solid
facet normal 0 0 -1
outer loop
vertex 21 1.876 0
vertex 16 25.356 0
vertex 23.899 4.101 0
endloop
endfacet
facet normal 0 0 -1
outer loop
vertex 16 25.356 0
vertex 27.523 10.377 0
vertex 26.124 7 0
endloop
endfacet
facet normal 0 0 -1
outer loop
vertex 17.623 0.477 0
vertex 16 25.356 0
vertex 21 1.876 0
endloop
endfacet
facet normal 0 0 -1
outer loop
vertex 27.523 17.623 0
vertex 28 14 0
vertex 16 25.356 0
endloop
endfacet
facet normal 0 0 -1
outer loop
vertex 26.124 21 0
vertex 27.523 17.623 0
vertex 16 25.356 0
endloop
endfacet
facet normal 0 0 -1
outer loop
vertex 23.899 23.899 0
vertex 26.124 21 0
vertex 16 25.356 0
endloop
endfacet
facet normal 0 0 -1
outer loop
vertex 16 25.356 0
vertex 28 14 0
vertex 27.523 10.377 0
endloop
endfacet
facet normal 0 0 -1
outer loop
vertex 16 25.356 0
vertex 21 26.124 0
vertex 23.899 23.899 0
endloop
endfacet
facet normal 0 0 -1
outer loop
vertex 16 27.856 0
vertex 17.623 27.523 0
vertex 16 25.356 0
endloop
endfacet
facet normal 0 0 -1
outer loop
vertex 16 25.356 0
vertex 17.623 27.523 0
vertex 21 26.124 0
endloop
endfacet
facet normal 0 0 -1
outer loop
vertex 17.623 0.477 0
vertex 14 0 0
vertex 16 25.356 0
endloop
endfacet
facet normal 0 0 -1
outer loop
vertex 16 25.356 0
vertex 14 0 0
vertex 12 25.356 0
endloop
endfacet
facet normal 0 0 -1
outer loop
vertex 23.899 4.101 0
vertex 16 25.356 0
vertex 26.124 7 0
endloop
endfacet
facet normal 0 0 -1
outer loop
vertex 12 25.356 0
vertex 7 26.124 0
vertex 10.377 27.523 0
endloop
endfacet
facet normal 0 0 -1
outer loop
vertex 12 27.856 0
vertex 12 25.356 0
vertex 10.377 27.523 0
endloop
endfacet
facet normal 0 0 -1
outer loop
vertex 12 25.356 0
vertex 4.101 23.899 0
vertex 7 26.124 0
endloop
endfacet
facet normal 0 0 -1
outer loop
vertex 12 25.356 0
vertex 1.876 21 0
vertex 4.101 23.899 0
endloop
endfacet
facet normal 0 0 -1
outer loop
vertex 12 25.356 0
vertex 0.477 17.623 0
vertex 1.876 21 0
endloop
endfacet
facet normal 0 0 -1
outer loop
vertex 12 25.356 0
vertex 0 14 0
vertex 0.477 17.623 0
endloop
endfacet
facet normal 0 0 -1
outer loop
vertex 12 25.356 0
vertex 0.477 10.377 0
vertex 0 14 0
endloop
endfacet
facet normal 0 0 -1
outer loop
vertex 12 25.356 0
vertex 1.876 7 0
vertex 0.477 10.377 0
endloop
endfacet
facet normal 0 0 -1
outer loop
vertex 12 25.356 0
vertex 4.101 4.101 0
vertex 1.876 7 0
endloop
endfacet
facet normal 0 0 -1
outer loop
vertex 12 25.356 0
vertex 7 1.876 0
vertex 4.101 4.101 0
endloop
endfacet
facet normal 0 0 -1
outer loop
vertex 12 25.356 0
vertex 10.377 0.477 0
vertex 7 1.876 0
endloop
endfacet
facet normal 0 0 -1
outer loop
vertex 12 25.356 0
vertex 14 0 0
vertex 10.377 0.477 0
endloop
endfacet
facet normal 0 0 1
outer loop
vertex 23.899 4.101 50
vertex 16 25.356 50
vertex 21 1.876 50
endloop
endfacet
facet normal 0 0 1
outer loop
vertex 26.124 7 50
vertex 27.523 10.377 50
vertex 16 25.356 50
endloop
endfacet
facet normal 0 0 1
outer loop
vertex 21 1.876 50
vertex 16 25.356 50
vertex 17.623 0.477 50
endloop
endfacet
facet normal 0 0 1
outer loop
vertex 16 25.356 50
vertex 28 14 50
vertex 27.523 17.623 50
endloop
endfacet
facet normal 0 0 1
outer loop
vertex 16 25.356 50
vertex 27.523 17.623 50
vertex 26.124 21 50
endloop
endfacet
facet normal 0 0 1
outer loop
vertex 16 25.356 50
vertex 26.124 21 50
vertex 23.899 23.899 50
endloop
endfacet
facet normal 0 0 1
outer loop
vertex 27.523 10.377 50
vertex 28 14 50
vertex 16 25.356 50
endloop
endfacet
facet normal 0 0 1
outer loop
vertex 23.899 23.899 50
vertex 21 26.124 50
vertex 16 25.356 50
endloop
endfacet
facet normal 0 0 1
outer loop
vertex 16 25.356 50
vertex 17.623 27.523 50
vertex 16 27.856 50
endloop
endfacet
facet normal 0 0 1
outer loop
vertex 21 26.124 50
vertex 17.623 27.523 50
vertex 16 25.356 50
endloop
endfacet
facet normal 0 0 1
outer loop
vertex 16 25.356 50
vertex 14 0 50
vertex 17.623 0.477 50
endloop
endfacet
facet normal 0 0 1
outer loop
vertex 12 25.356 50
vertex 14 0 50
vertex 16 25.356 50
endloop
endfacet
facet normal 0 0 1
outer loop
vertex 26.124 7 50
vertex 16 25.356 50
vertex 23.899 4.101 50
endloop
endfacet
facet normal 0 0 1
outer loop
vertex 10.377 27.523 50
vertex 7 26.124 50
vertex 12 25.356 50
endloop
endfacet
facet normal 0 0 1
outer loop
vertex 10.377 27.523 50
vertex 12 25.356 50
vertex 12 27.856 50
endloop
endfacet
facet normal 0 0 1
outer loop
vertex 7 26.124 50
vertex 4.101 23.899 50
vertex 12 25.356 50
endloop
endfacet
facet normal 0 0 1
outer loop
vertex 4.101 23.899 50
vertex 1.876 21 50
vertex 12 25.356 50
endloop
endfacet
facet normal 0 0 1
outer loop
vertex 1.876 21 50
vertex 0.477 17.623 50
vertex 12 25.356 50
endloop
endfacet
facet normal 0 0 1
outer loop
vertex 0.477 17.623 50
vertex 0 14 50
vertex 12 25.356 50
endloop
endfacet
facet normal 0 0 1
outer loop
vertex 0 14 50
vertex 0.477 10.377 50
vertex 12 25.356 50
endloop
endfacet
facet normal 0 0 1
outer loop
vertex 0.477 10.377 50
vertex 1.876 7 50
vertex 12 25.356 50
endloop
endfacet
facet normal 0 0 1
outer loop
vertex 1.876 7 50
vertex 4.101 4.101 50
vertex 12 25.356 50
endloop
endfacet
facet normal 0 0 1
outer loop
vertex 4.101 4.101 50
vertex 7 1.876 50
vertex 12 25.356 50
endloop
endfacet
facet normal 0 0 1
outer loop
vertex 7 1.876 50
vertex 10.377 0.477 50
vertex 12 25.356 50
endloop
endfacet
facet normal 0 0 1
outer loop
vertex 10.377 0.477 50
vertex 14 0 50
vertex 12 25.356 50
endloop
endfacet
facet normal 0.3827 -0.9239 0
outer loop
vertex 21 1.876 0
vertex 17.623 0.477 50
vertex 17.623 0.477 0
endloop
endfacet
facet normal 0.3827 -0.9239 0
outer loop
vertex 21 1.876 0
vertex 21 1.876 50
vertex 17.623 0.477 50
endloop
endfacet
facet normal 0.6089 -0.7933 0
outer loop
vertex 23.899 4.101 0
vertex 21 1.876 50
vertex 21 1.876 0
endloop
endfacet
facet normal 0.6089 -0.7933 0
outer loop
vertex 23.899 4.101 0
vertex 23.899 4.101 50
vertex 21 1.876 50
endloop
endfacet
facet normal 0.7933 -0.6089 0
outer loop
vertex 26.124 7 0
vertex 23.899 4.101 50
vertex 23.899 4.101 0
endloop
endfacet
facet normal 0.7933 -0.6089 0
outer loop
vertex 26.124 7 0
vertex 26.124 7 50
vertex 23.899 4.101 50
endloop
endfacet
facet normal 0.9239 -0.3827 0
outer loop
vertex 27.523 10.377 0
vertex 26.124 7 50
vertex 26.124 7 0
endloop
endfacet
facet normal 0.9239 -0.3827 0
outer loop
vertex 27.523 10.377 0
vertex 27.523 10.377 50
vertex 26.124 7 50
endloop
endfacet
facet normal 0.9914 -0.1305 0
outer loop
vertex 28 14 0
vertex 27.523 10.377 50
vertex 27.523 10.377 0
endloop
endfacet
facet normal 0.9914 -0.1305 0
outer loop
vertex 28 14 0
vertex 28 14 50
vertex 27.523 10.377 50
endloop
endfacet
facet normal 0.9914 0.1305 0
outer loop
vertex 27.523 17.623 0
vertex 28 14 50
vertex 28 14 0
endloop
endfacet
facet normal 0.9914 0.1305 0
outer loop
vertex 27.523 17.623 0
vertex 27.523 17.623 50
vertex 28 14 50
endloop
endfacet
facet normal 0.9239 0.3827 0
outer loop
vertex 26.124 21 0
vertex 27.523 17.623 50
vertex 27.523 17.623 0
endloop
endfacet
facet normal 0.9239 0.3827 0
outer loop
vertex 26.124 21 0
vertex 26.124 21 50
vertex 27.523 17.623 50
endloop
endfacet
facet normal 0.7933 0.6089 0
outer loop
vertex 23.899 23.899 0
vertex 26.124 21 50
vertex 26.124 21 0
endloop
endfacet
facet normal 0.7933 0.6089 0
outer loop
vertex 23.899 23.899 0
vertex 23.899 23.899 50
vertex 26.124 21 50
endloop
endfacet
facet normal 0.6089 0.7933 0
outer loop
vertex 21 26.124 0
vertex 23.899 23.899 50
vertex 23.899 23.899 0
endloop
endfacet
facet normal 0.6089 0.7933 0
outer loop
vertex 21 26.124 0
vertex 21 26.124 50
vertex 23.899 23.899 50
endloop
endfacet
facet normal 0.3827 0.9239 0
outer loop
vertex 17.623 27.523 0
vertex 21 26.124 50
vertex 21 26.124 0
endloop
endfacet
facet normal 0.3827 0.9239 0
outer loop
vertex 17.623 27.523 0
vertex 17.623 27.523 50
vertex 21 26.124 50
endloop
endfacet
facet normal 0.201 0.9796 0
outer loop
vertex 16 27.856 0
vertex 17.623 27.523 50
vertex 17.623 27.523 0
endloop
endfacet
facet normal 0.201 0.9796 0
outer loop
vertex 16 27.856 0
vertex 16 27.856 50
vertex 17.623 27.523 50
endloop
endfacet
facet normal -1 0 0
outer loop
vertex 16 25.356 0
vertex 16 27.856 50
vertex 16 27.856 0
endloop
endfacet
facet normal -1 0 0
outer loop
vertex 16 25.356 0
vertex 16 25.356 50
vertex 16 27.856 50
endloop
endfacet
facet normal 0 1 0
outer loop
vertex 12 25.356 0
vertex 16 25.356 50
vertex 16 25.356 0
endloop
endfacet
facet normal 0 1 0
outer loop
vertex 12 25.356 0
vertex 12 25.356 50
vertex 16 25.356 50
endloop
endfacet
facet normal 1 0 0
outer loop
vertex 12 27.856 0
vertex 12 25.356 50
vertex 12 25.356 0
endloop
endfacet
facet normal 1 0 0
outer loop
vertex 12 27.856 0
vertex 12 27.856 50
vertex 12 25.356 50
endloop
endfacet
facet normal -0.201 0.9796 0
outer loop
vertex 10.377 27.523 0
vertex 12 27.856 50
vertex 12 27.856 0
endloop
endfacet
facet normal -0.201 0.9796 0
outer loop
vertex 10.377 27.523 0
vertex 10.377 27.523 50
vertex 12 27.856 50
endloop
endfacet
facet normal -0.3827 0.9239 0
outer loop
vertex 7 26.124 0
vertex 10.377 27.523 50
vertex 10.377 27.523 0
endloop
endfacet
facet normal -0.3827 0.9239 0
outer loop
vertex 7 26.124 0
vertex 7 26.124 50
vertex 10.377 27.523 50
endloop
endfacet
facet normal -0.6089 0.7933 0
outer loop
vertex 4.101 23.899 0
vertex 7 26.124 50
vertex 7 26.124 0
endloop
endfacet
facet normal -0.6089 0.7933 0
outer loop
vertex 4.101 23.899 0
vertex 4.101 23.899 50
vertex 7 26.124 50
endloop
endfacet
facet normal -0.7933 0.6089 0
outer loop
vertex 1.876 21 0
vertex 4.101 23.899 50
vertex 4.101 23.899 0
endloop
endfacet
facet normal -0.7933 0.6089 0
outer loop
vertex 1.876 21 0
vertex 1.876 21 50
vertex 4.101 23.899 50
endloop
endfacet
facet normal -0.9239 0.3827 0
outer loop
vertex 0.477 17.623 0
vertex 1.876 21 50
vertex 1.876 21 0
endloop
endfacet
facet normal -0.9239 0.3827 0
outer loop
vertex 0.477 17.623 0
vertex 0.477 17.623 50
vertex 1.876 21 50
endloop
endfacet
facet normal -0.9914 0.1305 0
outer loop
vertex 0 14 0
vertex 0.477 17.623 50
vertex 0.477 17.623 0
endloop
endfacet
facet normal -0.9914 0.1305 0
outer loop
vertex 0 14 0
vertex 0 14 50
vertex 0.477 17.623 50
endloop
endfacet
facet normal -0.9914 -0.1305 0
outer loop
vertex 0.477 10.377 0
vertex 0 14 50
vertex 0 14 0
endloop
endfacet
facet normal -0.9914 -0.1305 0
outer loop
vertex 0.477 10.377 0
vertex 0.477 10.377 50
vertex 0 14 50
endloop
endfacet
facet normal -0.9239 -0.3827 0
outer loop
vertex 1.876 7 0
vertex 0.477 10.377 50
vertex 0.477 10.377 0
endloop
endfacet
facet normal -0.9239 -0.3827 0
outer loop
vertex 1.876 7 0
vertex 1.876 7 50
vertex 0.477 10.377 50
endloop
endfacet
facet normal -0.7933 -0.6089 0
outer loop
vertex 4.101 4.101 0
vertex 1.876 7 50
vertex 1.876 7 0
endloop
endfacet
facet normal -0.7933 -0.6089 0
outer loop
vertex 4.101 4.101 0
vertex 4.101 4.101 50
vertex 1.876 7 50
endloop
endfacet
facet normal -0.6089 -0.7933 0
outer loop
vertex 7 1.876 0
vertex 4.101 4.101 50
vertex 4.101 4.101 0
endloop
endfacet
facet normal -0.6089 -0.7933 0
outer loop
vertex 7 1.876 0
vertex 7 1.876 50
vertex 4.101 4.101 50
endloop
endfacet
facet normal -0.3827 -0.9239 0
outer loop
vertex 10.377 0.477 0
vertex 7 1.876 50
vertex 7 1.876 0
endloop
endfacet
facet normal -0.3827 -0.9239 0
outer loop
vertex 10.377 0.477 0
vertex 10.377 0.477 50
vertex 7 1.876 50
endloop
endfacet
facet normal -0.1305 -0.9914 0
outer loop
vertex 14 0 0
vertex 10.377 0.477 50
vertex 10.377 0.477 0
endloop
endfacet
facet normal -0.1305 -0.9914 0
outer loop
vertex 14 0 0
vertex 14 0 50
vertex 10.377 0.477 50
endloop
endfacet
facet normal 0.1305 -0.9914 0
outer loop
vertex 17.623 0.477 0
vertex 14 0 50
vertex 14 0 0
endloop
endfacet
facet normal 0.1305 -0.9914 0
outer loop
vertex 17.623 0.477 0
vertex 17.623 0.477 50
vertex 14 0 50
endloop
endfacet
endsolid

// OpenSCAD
$fn = 32;

// ----------------------------------------------------------------------
// Keyway shaft: d28 shaft, key 4 x 2.5 mm
// ----------------------------------------------------------------------

// --- parameters (mm) ---
shaft_r = 14;             // shaft radius
key_w = 4;                // keyway width
key_d = 2.5;              // keyway depth below the surface line
plate_t = 50;             // shaft length, Z (extrusion height)
fit_tol = 0.05;           // declared fit tolerance (prompt contract)
free_tol = 0.2;           // declared free tolerance (prompt contract)

shaft_d = 2 * shaft_r;  // shaft diameter
circle_step = 15;  // polygon sampling step, degrees

profile = [[10.377, 27.523], [7, 26.124], [4.101, 23.899], [1.876, 21], [0.477, 17.623], [0, 14], [0.477, 10.377], [1.876, 7], [4.101, 4.101], [7, 1.876], [10.377, 0.477], [14, 0], [17.623, 0.477], [21, 1.876], [23.899, 4.101], [26.124, 7], [27.523, 10.377], [28, 14], [27.523, 17.623], [26.124, 21], [23.899, 23.899], [21, 26.124], [17.623, 27.523], [16, 27.856], [16, 25.356], [12, 25.356], [12, 27.856]];  // primary outline, 27 points, counter clockwise

// --- the one profile operation ---
linear_extrude(height = plate_t) polygon(points = profile);
